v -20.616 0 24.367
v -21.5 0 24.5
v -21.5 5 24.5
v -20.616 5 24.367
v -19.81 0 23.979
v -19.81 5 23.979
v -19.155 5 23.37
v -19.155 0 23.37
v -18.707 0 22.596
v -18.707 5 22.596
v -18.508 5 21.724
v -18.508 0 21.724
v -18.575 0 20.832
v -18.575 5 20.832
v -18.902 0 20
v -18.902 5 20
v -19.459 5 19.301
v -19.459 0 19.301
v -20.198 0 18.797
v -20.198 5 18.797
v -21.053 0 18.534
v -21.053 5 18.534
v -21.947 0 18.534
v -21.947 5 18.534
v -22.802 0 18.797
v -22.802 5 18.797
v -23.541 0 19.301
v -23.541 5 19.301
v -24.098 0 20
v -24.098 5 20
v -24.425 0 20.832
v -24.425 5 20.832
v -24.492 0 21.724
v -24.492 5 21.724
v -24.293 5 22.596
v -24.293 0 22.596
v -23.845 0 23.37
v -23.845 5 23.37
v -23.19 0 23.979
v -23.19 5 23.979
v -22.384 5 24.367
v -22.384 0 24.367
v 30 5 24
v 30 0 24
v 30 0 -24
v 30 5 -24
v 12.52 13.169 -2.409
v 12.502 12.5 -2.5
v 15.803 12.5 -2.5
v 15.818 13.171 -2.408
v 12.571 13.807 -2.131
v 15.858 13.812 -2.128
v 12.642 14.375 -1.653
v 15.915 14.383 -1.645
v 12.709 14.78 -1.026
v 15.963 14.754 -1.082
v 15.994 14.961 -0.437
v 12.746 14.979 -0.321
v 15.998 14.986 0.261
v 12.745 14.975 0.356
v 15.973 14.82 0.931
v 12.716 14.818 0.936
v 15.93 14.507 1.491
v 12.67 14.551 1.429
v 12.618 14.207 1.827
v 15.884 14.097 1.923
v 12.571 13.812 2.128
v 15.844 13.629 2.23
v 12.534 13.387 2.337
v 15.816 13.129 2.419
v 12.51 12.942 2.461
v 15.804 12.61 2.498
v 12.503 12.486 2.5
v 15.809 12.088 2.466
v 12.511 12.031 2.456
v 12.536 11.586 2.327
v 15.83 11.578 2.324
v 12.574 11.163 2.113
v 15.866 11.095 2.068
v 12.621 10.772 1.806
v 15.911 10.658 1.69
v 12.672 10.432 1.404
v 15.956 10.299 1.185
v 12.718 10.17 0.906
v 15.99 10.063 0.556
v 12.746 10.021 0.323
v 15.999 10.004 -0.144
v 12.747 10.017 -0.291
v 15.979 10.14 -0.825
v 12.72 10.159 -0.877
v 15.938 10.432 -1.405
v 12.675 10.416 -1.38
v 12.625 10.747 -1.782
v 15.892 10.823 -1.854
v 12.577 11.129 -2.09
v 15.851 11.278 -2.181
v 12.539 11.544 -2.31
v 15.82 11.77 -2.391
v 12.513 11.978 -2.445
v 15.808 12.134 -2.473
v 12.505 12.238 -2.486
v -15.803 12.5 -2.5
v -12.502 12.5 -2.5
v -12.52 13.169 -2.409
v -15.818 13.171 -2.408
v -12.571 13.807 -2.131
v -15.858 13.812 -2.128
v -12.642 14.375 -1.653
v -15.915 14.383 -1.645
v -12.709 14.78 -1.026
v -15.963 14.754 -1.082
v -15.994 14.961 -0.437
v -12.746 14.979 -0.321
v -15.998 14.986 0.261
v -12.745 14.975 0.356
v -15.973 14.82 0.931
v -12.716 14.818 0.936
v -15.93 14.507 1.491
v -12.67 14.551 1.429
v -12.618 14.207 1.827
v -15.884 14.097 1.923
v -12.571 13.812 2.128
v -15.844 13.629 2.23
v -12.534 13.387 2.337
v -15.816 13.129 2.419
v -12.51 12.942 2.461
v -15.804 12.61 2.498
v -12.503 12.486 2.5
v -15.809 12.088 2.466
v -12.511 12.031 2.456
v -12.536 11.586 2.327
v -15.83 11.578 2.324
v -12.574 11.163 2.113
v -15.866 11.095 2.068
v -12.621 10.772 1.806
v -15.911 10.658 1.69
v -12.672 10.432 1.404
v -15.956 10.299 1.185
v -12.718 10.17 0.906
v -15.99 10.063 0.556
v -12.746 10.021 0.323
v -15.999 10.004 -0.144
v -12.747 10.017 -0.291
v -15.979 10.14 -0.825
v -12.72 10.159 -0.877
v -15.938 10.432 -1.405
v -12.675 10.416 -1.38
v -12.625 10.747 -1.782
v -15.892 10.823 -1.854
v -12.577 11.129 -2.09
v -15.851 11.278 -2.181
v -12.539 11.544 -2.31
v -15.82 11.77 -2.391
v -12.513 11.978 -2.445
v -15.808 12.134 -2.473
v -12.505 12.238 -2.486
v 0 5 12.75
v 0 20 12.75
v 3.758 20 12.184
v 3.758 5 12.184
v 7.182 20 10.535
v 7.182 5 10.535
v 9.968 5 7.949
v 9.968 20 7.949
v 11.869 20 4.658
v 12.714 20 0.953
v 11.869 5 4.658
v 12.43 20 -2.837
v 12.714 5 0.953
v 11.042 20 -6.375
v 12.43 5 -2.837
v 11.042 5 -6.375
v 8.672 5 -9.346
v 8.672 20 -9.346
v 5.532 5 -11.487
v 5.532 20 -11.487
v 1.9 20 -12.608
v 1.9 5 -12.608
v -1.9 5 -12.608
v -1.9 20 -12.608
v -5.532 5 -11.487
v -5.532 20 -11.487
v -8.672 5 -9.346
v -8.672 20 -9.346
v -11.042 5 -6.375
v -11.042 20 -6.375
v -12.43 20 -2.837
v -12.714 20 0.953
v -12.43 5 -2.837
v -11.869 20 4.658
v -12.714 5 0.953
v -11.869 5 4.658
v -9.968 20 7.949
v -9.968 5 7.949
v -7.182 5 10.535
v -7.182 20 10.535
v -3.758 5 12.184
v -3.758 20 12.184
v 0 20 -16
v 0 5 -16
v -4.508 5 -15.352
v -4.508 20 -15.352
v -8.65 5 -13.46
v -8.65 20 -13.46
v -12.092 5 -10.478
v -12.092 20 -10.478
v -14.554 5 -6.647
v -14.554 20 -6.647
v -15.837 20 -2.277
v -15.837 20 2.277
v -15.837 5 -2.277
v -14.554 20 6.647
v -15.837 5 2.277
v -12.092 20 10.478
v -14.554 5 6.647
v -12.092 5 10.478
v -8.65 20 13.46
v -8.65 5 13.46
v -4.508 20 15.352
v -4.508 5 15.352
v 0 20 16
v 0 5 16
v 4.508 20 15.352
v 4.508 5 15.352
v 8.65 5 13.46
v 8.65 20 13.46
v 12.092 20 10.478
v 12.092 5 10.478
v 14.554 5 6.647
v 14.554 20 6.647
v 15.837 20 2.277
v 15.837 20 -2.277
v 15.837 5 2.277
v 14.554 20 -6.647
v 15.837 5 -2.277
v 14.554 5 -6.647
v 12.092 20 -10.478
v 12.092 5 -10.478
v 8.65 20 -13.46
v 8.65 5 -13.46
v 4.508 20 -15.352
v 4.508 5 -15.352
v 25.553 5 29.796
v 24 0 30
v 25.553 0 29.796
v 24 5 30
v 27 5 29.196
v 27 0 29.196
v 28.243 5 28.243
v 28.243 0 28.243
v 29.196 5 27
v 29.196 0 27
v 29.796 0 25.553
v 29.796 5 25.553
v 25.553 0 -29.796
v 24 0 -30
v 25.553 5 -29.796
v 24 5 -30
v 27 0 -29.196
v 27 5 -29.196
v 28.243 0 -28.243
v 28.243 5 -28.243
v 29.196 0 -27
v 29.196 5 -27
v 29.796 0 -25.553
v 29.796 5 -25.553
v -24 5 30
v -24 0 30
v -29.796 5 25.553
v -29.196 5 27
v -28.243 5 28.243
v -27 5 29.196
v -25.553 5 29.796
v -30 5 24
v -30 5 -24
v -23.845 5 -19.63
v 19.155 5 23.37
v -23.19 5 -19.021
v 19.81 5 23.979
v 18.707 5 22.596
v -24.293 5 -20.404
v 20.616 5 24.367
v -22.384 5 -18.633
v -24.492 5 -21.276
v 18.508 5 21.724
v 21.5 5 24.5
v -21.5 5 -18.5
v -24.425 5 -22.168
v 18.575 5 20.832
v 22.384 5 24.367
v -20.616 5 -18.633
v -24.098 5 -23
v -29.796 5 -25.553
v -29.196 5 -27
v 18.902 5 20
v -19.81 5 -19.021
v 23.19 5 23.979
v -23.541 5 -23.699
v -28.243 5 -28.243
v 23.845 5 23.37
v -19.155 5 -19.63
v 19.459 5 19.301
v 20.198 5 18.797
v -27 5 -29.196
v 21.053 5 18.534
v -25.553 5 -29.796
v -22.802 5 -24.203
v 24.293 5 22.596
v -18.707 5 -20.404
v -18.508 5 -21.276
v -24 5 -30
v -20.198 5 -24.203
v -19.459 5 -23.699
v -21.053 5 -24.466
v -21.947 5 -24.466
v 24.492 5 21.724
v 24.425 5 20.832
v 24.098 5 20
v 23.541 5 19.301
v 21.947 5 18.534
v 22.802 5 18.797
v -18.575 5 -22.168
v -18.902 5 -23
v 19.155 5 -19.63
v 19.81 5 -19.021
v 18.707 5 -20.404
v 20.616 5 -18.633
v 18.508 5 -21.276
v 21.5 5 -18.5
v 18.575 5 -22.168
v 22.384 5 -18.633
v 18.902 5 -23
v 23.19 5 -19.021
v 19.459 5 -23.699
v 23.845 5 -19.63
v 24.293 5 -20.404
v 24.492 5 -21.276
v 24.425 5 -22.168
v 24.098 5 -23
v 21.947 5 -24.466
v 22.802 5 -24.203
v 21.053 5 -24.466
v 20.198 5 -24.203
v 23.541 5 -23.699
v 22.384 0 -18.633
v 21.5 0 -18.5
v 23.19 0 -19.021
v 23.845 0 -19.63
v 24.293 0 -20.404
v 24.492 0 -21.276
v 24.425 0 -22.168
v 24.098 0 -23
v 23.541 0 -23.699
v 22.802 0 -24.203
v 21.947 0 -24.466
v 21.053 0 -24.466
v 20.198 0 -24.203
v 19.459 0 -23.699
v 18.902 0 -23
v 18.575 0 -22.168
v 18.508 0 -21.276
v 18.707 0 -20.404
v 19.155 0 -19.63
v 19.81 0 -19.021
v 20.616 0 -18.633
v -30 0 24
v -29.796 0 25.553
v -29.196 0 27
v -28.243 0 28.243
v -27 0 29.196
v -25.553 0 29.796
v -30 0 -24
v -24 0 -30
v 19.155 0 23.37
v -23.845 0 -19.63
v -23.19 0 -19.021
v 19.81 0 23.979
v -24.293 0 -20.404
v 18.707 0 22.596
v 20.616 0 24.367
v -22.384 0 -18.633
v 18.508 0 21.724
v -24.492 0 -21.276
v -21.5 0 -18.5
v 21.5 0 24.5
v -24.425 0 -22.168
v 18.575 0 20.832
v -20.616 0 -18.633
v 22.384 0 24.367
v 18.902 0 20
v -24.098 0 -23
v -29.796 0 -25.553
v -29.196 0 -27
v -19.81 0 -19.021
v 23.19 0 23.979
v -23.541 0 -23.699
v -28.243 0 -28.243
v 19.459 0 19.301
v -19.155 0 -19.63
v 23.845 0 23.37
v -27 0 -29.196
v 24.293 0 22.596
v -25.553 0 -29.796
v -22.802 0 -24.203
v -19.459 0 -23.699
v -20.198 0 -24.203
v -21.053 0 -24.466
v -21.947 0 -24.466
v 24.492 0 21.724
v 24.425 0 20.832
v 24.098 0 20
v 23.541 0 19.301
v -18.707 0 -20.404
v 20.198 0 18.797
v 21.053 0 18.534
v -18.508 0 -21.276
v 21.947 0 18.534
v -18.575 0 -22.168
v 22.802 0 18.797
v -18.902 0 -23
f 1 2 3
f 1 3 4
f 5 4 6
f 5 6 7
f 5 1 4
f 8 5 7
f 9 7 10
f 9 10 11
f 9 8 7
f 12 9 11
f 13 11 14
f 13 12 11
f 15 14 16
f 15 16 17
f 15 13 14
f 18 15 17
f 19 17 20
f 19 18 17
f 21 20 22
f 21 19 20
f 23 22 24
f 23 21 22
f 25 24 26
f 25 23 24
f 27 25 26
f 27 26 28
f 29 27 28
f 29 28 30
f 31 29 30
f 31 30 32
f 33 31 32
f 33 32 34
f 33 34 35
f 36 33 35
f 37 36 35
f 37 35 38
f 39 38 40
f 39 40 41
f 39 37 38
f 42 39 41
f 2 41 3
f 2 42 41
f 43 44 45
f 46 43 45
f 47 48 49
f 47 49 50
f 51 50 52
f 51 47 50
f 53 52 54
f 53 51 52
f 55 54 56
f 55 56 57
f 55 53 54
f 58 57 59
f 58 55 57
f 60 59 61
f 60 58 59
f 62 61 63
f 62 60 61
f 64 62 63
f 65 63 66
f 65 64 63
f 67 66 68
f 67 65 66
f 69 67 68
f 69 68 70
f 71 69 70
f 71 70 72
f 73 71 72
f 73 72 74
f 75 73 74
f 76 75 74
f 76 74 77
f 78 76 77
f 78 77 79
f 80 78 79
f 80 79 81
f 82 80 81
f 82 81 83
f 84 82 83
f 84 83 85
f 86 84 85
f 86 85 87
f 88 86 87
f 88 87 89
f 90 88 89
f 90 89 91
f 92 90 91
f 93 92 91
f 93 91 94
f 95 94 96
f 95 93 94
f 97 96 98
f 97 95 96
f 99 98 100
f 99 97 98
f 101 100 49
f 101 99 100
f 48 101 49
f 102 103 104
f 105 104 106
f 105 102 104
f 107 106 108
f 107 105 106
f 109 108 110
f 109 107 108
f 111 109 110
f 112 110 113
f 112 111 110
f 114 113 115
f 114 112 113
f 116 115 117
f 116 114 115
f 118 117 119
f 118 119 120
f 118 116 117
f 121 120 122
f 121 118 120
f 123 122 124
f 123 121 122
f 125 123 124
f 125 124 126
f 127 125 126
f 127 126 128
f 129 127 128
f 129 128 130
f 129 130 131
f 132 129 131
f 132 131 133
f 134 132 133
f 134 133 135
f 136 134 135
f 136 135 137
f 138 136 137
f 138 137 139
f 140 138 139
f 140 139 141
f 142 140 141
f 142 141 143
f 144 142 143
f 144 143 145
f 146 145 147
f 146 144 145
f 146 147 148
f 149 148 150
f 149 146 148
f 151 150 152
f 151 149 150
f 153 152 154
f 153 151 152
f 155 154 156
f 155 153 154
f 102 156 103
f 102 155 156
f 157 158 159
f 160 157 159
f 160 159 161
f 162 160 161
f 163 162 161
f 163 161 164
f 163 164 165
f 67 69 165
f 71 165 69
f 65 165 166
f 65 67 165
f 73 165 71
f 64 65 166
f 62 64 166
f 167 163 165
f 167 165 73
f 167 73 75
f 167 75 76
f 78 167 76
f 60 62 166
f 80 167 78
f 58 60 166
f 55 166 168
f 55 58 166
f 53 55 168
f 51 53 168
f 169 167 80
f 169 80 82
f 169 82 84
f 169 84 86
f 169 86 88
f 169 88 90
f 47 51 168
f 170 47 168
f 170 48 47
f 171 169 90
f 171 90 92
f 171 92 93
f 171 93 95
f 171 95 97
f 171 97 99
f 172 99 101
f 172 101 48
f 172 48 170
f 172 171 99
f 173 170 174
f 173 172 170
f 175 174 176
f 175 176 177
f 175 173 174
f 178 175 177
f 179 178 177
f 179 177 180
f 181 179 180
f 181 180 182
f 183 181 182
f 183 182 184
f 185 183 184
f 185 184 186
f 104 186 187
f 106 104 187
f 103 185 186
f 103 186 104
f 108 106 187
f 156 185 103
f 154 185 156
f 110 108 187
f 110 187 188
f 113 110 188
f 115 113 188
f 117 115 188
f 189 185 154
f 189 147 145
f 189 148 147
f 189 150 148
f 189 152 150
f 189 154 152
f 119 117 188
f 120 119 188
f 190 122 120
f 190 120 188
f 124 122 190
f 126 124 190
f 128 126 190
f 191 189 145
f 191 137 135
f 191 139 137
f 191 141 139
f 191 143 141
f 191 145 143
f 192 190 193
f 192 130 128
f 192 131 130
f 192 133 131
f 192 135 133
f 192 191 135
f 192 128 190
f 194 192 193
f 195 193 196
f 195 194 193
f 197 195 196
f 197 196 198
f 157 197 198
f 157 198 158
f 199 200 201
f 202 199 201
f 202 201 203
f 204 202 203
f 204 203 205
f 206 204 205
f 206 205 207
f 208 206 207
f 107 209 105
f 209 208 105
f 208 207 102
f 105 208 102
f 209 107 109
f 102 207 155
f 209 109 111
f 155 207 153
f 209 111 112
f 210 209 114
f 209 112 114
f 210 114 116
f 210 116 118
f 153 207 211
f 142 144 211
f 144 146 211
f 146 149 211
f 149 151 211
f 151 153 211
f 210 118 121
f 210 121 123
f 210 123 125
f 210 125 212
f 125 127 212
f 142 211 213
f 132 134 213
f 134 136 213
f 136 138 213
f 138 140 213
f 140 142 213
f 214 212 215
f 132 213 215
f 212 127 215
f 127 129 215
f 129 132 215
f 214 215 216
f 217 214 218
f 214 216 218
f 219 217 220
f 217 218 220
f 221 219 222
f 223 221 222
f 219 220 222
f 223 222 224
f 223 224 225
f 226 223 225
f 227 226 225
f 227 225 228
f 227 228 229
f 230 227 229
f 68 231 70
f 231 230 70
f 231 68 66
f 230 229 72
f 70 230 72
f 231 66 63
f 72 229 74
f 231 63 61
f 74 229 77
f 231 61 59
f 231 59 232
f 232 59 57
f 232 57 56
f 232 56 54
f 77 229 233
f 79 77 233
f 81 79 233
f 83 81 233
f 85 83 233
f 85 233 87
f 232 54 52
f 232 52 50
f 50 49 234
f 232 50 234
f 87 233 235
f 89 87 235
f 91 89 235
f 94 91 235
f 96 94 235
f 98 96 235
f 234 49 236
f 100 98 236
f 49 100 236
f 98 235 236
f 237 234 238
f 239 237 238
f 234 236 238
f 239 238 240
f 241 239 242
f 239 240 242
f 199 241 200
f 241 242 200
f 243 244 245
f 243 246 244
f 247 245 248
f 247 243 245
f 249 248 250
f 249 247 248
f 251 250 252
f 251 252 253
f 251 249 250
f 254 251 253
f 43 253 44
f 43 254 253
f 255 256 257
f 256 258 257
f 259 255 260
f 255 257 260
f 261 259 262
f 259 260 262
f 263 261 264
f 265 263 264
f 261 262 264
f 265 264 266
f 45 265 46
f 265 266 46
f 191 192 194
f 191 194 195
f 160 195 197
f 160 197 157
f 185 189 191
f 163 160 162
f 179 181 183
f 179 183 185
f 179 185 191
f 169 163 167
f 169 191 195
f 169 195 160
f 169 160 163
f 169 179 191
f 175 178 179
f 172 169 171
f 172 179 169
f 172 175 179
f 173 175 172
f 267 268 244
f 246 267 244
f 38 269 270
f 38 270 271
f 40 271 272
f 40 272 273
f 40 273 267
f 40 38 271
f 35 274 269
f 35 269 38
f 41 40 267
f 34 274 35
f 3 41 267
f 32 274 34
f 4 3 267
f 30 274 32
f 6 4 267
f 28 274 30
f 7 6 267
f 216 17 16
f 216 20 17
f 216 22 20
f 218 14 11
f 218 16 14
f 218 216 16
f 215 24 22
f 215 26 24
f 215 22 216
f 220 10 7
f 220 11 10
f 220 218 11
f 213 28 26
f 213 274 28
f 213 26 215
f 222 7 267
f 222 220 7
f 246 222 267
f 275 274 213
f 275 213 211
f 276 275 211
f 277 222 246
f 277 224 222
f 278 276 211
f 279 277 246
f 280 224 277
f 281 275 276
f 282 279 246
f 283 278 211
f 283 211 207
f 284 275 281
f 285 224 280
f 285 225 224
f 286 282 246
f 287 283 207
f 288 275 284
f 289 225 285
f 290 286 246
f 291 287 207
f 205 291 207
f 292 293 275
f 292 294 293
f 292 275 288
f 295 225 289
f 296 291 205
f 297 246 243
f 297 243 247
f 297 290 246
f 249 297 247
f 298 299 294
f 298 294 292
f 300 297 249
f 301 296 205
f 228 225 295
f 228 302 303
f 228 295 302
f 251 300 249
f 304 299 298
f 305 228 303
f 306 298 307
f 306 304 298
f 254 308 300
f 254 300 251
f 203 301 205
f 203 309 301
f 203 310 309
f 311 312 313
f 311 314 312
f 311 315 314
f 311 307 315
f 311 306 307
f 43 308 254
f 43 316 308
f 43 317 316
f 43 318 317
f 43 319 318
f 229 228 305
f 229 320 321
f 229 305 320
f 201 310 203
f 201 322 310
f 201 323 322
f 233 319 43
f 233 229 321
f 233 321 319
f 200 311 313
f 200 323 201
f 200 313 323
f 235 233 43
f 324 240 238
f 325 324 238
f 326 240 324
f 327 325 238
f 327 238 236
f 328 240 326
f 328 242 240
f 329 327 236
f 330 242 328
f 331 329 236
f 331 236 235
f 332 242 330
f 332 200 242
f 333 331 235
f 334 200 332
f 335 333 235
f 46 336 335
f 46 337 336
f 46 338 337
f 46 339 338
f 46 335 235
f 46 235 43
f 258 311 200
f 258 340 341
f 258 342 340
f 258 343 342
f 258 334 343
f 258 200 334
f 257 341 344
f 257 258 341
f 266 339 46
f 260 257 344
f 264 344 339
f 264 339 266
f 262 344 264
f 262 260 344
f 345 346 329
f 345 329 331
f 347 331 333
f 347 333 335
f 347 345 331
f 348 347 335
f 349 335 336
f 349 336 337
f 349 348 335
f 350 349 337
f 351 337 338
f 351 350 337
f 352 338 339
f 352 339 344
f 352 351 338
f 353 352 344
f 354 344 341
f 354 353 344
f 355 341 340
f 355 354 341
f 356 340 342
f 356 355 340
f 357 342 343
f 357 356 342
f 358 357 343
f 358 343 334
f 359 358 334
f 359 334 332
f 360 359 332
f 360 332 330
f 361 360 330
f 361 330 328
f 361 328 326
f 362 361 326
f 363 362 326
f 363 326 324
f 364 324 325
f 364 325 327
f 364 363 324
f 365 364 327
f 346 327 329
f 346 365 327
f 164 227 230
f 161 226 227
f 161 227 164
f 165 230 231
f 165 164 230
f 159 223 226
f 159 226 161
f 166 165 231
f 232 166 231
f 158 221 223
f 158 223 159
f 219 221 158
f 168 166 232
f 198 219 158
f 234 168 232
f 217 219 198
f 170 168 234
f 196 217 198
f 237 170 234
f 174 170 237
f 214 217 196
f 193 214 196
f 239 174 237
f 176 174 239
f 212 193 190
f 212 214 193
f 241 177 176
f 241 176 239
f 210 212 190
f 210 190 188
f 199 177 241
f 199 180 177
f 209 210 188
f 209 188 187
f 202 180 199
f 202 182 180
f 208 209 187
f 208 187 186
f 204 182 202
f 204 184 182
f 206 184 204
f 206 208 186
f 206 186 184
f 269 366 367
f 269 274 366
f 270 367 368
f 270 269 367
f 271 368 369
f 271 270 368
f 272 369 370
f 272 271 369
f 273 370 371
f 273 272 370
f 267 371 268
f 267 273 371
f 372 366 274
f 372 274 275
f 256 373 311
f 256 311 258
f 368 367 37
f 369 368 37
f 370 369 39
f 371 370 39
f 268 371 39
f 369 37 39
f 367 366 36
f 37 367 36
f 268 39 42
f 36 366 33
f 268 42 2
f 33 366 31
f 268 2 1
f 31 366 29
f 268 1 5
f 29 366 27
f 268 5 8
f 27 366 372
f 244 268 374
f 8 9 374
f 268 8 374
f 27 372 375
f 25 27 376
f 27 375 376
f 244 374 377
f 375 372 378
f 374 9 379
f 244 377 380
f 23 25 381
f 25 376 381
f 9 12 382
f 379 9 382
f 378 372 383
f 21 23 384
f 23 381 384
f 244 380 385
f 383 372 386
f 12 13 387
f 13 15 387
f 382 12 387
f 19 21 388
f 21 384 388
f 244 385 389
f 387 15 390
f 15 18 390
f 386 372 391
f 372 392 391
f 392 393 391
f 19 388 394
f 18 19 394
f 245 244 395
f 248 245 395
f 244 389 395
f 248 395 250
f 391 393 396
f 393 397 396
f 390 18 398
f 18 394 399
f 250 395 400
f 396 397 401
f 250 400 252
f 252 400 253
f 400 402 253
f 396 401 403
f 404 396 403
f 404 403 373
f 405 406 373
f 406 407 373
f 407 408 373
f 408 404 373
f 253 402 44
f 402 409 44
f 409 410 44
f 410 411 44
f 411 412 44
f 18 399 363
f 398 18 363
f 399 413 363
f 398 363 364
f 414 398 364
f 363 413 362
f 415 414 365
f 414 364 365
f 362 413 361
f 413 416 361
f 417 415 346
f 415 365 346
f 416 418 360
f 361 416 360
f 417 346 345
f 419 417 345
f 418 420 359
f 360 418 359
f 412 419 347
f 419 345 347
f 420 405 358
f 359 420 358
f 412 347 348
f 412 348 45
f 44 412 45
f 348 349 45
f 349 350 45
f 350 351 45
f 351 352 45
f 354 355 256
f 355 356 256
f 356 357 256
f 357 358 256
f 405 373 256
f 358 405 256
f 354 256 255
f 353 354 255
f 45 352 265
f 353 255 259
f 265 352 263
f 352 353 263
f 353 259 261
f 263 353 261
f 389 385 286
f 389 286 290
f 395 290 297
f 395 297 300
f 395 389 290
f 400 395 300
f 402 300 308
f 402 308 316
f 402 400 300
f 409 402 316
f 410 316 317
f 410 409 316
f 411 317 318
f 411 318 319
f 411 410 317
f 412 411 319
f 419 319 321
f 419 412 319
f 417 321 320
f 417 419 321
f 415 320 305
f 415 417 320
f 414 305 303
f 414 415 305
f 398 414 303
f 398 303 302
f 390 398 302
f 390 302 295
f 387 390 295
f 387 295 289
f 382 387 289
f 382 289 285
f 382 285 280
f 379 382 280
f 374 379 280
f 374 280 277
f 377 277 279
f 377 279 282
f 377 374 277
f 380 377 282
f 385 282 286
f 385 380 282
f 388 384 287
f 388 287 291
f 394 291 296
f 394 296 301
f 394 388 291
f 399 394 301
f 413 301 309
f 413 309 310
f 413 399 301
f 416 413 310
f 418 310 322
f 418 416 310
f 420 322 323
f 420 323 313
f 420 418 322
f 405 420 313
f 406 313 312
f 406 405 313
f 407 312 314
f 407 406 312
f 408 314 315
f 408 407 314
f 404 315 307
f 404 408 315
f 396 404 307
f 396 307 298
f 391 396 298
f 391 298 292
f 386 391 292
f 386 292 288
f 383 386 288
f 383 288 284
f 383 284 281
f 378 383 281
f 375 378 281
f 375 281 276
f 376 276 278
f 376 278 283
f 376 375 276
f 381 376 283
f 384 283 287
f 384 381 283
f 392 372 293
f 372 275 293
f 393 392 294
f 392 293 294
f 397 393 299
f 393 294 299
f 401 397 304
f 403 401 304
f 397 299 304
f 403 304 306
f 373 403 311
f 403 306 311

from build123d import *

# Parameters (mm, degrees)
SKETCH1_W               = 60
SKETCH1_H               = 60
SKETCH1_R               = 3
BOSS_EXTRUDE1_DEPTH     = 5
FILLET1_R               = 6
SKETCH2_R               = 16
SKETCH2_R_2             = 12.75
BOSS_EXTRUDE2_DEPTH     = 15
CUT_EXTRUDE1_DEPTH      = 47.904157598
CUT_EXTRUDE1_DEPTH_BACK = 47.904157598
SKETCH3_R               = 2.5


with BuildPart() as part:
    # Sketch1 → Boss-Extrude1 (new body)
    with BuildSketch(Plane(origin=(0, 0, 0), x_dir=(1, 0, 0), z_dir=(0, 1, 0))):
        Rectangle(SKETCH1_W, SKETCH1_H)
        with Locations(Location((21.5, 21.5, 0), (0, 0, 270))):
            Circle(SKETCH1_R, mode=Mode.SUBTRACT)
        with Locations(Location((-21.5, 21.5, 0), (0, 0, 270))):
            Circle(SKETCH1_R, mode=Mode.SUBTRACT)
        with Locations(Location((-21.5, -21.5, 0), (0, 0, 270))):
            Circle(SKETCH1_R, mode=Mode.SUBTRACT)
        with Locations(Location((21.5, -21.5, 0), (0, 0, 270))):
            Circle(SKETCH1_R, mode=Mode.SUBTRACT)
    extrude(amount=BOSS_EXTRUDE1_DEPTH)

    # Fillet1
    fillet1_edges = [part.edges().sort_by_distance(p)[0] for p in [
        (30, 2.5, 30),
        (-30, 2.5, 30),
        (-30, 2.5, -30),
        (30, 2.5, -30),
    ]]
    fillet(fillet1_edges, radius=FILLET1_R)

    # Sketch2 → Boss-Extrude2 (add)
    with BuildSketch(Plane(origin=(0, 5, 0), x_dir=(1, 0, 0), z_dir=(0, 1, 0))):
        with Locations(Location((0, 0, 0), (0, 0, 90))):
            Circle(SKETCH2_R)
        with Locations(Location((0, 0, 0), (0, 0, 270))):
            Circle(SKETCH2_R_2, mode=Mode.SUBTRACT)
    extrude(amount=BOSS_EXTRUDE2_DEPTH)

    # Sketch3 → Cut-Extrude1 (cut, two sides: drawn at the far end of the back side and taken through both)
    with BuildSketch(Plane(origin=(0, 0, 0), x_dir=(0, 0, -1), z_dir=(1, 0, 0)).offset(-CUT_EXTRUDE1_DEPTH_BACK)):
        with Locations((0, 12.5)):
            Circle(SKETCH3_R)
    extrude(amount=CUT_EXTRUDE1_DEPTH + CUT_EXTRUDE1_DEPTH_BACK, mode=Mode.SUBTRACT)


solid = part.part
